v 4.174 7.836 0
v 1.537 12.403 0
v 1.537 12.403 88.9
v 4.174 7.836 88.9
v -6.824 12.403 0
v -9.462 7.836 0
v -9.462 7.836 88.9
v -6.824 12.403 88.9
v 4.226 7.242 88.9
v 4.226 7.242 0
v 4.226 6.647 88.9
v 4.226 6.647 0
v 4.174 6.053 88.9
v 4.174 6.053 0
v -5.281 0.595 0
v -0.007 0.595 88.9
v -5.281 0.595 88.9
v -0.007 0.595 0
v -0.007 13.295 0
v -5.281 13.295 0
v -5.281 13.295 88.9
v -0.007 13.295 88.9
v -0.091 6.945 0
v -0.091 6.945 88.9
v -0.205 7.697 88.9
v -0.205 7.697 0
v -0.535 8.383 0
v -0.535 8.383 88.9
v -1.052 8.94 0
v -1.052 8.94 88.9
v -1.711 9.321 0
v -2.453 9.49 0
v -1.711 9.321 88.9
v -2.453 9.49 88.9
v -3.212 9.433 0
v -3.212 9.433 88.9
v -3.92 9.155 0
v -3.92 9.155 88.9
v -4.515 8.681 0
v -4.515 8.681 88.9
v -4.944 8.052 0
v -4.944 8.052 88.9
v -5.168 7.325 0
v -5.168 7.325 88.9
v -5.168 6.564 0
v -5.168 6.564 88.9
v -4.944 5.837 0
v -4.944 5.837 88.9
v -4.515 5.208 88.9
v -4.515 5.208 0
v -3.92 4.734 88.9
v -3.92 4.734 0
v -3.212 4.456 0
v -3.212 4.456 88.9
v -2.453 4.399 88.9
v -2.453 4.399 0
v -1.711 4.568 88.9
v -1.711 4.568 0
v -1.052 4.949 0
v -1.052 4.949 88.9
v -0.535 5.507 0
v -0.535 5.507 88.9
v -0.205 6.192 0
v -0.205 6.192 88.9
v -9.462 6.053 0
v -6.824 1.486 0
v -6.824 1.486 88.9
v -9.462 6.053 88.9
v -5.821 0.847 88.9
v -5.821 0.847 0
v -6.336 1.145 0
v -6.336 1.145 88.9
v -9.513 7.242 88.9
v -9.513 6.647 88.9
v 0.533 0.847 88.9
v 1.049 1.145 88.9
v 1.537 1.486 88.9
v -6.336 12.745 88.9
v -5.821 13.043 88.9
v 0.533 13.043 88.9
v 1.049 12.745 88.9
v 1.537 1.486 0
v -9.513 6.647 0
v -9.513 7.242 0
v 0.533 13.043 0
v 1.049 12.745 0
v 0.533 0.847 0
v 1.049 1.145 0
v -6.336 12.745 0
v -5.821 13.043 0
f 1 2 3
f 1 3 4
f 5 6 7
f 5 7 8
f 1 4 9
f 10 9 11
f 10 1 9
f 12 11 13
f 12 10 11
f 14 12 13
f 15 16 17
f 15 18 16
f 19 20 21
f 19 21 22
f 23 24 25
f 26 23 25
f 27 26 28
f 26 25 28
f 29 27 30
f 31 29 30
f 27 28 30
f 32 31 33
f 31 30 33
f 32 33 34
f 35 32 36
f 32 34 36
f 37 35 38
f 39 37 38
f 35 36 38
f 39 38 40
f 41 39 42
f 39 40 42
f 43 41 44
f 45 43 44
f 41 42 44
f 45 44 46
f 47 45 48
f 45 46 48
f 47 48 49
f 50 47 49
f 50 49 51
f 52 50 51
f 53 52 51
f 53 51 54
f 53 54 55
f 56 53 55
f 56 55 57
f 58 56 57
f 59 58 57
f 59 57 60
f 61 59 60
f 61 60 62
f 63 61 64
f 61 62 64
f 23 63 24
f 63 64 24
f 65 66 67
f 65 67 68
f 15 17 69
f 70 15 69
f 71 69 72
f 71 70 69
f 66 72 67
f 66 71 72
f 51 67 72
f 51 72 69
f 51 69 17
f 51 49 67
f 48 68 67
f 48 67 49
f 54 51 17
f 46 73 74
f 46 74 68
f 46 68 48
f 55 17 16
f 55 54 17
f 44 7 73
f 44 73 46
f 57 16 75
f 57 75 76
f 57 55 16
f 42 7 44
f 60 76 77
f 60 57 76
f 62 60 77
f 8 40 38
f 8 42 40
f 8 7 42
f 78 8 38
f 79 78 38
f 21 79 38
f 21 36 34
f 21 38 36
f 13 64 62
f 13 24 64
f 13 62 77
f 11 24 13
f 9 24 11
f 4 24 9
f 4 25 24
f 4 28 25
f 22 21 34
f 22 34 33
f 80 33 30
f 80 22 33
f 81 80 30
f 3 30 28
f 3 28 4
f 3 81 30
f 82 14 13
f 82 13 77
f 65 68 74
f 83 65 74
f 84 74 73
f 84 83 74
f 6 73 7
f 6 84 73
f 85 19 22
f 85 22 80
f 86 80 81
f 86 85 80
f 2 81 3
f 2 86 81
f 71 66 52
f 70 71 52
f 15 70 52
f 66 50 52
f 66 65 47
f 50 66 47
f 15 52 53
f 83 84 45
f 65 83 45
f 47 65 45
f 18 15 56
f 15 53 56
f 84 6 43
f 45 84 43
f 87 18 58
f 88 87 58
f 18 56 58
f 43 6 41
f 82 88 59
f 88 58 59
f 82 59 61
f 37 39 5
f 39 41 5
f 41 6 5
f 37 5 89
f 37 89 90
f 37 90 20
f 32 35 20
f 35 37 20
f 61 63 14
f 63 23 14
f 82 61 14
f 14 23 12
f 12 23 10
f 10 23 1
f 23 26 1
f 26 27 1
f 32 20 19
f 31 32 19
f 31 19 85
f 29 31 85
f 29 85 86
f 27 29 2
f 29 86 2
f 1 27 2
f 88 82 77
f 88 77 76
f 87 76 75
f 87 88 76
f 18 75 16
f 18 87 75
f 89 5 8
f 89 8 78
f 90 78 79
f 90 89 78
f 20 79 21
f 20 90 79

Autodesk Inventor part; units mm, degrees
ref_plane "YZ Plane" through (0, 0, 0) normal (1, 0, 0) x (0, 1, 0)
ref_plane "XZ Plane" through (0, 0, 0) normal (0, 1, 0) x (-1, 0, 0)
ref_plane "XY Plane" through (0, 0, 0) normal (0, 0, 1) x (1, 0, 0)
sketch "Sketch1" plane through (0, 0, 0) normal (0, 0, 1) x (1, 0, 0)
  circle A0 centre (-2.6438, 6.9447) radius 6.8758
  line L0 (-9.4616, 7.8359) -> (-6.8245, 12.4034)
  line L1 (-6.8245, 1.4859) -> (-9.4616, 6.0534)
  line L2 (-0.0068, 0.5947) -> (-5.2808, 0.5947)
  line L3 (4.174, 6.0534) -> (1.537, 1.4859)
  line L4 (1.537, 12.4034) -> (4.174, 7.8359)
  line L5 (-5.2808, 13.2947) -> (-0.0068, 13.2947)
  point P0 (0, 0)
  point P1 (1.537, 1.4859)
  dimension "d0" = 13.7516
  dimension "d4" = 360
extrude "Extrusion1" add sketch "Sketch1" along normal blind 88.9 contours A0 L3 L2 L1 L0 L5 L4
sketch "Sketch2" plane through (0, 0, 88.9) normal (0, 0, 1) x (1, 0, 0)
  circle A0 centre (-2.6438, 6.9447) radius 2.5527
  line L0 (-5.2808, 0.5947) -> (-0.0068, 0.5947) projected
  line L1 (-2.6438, 6.9447) -> (-5.2808, 0.5947) construction
  line L2 (-2.6438, 6.9447) -> (-0.0068, 0.5947) construction
  point P0 (0, 0)
  dimension "d8" = 5.1054
  dimension "d9" = 6.35
extrude "Extrusion2" cut sketch "Sketch2" against normal blind 88.9
equation "\"d6\" = d5"
equation "\"d10\" = d5"
equation "\"d5\" = 88.9"
properties part number "AIntakeArmShaft" material "Aluminum 6061"
